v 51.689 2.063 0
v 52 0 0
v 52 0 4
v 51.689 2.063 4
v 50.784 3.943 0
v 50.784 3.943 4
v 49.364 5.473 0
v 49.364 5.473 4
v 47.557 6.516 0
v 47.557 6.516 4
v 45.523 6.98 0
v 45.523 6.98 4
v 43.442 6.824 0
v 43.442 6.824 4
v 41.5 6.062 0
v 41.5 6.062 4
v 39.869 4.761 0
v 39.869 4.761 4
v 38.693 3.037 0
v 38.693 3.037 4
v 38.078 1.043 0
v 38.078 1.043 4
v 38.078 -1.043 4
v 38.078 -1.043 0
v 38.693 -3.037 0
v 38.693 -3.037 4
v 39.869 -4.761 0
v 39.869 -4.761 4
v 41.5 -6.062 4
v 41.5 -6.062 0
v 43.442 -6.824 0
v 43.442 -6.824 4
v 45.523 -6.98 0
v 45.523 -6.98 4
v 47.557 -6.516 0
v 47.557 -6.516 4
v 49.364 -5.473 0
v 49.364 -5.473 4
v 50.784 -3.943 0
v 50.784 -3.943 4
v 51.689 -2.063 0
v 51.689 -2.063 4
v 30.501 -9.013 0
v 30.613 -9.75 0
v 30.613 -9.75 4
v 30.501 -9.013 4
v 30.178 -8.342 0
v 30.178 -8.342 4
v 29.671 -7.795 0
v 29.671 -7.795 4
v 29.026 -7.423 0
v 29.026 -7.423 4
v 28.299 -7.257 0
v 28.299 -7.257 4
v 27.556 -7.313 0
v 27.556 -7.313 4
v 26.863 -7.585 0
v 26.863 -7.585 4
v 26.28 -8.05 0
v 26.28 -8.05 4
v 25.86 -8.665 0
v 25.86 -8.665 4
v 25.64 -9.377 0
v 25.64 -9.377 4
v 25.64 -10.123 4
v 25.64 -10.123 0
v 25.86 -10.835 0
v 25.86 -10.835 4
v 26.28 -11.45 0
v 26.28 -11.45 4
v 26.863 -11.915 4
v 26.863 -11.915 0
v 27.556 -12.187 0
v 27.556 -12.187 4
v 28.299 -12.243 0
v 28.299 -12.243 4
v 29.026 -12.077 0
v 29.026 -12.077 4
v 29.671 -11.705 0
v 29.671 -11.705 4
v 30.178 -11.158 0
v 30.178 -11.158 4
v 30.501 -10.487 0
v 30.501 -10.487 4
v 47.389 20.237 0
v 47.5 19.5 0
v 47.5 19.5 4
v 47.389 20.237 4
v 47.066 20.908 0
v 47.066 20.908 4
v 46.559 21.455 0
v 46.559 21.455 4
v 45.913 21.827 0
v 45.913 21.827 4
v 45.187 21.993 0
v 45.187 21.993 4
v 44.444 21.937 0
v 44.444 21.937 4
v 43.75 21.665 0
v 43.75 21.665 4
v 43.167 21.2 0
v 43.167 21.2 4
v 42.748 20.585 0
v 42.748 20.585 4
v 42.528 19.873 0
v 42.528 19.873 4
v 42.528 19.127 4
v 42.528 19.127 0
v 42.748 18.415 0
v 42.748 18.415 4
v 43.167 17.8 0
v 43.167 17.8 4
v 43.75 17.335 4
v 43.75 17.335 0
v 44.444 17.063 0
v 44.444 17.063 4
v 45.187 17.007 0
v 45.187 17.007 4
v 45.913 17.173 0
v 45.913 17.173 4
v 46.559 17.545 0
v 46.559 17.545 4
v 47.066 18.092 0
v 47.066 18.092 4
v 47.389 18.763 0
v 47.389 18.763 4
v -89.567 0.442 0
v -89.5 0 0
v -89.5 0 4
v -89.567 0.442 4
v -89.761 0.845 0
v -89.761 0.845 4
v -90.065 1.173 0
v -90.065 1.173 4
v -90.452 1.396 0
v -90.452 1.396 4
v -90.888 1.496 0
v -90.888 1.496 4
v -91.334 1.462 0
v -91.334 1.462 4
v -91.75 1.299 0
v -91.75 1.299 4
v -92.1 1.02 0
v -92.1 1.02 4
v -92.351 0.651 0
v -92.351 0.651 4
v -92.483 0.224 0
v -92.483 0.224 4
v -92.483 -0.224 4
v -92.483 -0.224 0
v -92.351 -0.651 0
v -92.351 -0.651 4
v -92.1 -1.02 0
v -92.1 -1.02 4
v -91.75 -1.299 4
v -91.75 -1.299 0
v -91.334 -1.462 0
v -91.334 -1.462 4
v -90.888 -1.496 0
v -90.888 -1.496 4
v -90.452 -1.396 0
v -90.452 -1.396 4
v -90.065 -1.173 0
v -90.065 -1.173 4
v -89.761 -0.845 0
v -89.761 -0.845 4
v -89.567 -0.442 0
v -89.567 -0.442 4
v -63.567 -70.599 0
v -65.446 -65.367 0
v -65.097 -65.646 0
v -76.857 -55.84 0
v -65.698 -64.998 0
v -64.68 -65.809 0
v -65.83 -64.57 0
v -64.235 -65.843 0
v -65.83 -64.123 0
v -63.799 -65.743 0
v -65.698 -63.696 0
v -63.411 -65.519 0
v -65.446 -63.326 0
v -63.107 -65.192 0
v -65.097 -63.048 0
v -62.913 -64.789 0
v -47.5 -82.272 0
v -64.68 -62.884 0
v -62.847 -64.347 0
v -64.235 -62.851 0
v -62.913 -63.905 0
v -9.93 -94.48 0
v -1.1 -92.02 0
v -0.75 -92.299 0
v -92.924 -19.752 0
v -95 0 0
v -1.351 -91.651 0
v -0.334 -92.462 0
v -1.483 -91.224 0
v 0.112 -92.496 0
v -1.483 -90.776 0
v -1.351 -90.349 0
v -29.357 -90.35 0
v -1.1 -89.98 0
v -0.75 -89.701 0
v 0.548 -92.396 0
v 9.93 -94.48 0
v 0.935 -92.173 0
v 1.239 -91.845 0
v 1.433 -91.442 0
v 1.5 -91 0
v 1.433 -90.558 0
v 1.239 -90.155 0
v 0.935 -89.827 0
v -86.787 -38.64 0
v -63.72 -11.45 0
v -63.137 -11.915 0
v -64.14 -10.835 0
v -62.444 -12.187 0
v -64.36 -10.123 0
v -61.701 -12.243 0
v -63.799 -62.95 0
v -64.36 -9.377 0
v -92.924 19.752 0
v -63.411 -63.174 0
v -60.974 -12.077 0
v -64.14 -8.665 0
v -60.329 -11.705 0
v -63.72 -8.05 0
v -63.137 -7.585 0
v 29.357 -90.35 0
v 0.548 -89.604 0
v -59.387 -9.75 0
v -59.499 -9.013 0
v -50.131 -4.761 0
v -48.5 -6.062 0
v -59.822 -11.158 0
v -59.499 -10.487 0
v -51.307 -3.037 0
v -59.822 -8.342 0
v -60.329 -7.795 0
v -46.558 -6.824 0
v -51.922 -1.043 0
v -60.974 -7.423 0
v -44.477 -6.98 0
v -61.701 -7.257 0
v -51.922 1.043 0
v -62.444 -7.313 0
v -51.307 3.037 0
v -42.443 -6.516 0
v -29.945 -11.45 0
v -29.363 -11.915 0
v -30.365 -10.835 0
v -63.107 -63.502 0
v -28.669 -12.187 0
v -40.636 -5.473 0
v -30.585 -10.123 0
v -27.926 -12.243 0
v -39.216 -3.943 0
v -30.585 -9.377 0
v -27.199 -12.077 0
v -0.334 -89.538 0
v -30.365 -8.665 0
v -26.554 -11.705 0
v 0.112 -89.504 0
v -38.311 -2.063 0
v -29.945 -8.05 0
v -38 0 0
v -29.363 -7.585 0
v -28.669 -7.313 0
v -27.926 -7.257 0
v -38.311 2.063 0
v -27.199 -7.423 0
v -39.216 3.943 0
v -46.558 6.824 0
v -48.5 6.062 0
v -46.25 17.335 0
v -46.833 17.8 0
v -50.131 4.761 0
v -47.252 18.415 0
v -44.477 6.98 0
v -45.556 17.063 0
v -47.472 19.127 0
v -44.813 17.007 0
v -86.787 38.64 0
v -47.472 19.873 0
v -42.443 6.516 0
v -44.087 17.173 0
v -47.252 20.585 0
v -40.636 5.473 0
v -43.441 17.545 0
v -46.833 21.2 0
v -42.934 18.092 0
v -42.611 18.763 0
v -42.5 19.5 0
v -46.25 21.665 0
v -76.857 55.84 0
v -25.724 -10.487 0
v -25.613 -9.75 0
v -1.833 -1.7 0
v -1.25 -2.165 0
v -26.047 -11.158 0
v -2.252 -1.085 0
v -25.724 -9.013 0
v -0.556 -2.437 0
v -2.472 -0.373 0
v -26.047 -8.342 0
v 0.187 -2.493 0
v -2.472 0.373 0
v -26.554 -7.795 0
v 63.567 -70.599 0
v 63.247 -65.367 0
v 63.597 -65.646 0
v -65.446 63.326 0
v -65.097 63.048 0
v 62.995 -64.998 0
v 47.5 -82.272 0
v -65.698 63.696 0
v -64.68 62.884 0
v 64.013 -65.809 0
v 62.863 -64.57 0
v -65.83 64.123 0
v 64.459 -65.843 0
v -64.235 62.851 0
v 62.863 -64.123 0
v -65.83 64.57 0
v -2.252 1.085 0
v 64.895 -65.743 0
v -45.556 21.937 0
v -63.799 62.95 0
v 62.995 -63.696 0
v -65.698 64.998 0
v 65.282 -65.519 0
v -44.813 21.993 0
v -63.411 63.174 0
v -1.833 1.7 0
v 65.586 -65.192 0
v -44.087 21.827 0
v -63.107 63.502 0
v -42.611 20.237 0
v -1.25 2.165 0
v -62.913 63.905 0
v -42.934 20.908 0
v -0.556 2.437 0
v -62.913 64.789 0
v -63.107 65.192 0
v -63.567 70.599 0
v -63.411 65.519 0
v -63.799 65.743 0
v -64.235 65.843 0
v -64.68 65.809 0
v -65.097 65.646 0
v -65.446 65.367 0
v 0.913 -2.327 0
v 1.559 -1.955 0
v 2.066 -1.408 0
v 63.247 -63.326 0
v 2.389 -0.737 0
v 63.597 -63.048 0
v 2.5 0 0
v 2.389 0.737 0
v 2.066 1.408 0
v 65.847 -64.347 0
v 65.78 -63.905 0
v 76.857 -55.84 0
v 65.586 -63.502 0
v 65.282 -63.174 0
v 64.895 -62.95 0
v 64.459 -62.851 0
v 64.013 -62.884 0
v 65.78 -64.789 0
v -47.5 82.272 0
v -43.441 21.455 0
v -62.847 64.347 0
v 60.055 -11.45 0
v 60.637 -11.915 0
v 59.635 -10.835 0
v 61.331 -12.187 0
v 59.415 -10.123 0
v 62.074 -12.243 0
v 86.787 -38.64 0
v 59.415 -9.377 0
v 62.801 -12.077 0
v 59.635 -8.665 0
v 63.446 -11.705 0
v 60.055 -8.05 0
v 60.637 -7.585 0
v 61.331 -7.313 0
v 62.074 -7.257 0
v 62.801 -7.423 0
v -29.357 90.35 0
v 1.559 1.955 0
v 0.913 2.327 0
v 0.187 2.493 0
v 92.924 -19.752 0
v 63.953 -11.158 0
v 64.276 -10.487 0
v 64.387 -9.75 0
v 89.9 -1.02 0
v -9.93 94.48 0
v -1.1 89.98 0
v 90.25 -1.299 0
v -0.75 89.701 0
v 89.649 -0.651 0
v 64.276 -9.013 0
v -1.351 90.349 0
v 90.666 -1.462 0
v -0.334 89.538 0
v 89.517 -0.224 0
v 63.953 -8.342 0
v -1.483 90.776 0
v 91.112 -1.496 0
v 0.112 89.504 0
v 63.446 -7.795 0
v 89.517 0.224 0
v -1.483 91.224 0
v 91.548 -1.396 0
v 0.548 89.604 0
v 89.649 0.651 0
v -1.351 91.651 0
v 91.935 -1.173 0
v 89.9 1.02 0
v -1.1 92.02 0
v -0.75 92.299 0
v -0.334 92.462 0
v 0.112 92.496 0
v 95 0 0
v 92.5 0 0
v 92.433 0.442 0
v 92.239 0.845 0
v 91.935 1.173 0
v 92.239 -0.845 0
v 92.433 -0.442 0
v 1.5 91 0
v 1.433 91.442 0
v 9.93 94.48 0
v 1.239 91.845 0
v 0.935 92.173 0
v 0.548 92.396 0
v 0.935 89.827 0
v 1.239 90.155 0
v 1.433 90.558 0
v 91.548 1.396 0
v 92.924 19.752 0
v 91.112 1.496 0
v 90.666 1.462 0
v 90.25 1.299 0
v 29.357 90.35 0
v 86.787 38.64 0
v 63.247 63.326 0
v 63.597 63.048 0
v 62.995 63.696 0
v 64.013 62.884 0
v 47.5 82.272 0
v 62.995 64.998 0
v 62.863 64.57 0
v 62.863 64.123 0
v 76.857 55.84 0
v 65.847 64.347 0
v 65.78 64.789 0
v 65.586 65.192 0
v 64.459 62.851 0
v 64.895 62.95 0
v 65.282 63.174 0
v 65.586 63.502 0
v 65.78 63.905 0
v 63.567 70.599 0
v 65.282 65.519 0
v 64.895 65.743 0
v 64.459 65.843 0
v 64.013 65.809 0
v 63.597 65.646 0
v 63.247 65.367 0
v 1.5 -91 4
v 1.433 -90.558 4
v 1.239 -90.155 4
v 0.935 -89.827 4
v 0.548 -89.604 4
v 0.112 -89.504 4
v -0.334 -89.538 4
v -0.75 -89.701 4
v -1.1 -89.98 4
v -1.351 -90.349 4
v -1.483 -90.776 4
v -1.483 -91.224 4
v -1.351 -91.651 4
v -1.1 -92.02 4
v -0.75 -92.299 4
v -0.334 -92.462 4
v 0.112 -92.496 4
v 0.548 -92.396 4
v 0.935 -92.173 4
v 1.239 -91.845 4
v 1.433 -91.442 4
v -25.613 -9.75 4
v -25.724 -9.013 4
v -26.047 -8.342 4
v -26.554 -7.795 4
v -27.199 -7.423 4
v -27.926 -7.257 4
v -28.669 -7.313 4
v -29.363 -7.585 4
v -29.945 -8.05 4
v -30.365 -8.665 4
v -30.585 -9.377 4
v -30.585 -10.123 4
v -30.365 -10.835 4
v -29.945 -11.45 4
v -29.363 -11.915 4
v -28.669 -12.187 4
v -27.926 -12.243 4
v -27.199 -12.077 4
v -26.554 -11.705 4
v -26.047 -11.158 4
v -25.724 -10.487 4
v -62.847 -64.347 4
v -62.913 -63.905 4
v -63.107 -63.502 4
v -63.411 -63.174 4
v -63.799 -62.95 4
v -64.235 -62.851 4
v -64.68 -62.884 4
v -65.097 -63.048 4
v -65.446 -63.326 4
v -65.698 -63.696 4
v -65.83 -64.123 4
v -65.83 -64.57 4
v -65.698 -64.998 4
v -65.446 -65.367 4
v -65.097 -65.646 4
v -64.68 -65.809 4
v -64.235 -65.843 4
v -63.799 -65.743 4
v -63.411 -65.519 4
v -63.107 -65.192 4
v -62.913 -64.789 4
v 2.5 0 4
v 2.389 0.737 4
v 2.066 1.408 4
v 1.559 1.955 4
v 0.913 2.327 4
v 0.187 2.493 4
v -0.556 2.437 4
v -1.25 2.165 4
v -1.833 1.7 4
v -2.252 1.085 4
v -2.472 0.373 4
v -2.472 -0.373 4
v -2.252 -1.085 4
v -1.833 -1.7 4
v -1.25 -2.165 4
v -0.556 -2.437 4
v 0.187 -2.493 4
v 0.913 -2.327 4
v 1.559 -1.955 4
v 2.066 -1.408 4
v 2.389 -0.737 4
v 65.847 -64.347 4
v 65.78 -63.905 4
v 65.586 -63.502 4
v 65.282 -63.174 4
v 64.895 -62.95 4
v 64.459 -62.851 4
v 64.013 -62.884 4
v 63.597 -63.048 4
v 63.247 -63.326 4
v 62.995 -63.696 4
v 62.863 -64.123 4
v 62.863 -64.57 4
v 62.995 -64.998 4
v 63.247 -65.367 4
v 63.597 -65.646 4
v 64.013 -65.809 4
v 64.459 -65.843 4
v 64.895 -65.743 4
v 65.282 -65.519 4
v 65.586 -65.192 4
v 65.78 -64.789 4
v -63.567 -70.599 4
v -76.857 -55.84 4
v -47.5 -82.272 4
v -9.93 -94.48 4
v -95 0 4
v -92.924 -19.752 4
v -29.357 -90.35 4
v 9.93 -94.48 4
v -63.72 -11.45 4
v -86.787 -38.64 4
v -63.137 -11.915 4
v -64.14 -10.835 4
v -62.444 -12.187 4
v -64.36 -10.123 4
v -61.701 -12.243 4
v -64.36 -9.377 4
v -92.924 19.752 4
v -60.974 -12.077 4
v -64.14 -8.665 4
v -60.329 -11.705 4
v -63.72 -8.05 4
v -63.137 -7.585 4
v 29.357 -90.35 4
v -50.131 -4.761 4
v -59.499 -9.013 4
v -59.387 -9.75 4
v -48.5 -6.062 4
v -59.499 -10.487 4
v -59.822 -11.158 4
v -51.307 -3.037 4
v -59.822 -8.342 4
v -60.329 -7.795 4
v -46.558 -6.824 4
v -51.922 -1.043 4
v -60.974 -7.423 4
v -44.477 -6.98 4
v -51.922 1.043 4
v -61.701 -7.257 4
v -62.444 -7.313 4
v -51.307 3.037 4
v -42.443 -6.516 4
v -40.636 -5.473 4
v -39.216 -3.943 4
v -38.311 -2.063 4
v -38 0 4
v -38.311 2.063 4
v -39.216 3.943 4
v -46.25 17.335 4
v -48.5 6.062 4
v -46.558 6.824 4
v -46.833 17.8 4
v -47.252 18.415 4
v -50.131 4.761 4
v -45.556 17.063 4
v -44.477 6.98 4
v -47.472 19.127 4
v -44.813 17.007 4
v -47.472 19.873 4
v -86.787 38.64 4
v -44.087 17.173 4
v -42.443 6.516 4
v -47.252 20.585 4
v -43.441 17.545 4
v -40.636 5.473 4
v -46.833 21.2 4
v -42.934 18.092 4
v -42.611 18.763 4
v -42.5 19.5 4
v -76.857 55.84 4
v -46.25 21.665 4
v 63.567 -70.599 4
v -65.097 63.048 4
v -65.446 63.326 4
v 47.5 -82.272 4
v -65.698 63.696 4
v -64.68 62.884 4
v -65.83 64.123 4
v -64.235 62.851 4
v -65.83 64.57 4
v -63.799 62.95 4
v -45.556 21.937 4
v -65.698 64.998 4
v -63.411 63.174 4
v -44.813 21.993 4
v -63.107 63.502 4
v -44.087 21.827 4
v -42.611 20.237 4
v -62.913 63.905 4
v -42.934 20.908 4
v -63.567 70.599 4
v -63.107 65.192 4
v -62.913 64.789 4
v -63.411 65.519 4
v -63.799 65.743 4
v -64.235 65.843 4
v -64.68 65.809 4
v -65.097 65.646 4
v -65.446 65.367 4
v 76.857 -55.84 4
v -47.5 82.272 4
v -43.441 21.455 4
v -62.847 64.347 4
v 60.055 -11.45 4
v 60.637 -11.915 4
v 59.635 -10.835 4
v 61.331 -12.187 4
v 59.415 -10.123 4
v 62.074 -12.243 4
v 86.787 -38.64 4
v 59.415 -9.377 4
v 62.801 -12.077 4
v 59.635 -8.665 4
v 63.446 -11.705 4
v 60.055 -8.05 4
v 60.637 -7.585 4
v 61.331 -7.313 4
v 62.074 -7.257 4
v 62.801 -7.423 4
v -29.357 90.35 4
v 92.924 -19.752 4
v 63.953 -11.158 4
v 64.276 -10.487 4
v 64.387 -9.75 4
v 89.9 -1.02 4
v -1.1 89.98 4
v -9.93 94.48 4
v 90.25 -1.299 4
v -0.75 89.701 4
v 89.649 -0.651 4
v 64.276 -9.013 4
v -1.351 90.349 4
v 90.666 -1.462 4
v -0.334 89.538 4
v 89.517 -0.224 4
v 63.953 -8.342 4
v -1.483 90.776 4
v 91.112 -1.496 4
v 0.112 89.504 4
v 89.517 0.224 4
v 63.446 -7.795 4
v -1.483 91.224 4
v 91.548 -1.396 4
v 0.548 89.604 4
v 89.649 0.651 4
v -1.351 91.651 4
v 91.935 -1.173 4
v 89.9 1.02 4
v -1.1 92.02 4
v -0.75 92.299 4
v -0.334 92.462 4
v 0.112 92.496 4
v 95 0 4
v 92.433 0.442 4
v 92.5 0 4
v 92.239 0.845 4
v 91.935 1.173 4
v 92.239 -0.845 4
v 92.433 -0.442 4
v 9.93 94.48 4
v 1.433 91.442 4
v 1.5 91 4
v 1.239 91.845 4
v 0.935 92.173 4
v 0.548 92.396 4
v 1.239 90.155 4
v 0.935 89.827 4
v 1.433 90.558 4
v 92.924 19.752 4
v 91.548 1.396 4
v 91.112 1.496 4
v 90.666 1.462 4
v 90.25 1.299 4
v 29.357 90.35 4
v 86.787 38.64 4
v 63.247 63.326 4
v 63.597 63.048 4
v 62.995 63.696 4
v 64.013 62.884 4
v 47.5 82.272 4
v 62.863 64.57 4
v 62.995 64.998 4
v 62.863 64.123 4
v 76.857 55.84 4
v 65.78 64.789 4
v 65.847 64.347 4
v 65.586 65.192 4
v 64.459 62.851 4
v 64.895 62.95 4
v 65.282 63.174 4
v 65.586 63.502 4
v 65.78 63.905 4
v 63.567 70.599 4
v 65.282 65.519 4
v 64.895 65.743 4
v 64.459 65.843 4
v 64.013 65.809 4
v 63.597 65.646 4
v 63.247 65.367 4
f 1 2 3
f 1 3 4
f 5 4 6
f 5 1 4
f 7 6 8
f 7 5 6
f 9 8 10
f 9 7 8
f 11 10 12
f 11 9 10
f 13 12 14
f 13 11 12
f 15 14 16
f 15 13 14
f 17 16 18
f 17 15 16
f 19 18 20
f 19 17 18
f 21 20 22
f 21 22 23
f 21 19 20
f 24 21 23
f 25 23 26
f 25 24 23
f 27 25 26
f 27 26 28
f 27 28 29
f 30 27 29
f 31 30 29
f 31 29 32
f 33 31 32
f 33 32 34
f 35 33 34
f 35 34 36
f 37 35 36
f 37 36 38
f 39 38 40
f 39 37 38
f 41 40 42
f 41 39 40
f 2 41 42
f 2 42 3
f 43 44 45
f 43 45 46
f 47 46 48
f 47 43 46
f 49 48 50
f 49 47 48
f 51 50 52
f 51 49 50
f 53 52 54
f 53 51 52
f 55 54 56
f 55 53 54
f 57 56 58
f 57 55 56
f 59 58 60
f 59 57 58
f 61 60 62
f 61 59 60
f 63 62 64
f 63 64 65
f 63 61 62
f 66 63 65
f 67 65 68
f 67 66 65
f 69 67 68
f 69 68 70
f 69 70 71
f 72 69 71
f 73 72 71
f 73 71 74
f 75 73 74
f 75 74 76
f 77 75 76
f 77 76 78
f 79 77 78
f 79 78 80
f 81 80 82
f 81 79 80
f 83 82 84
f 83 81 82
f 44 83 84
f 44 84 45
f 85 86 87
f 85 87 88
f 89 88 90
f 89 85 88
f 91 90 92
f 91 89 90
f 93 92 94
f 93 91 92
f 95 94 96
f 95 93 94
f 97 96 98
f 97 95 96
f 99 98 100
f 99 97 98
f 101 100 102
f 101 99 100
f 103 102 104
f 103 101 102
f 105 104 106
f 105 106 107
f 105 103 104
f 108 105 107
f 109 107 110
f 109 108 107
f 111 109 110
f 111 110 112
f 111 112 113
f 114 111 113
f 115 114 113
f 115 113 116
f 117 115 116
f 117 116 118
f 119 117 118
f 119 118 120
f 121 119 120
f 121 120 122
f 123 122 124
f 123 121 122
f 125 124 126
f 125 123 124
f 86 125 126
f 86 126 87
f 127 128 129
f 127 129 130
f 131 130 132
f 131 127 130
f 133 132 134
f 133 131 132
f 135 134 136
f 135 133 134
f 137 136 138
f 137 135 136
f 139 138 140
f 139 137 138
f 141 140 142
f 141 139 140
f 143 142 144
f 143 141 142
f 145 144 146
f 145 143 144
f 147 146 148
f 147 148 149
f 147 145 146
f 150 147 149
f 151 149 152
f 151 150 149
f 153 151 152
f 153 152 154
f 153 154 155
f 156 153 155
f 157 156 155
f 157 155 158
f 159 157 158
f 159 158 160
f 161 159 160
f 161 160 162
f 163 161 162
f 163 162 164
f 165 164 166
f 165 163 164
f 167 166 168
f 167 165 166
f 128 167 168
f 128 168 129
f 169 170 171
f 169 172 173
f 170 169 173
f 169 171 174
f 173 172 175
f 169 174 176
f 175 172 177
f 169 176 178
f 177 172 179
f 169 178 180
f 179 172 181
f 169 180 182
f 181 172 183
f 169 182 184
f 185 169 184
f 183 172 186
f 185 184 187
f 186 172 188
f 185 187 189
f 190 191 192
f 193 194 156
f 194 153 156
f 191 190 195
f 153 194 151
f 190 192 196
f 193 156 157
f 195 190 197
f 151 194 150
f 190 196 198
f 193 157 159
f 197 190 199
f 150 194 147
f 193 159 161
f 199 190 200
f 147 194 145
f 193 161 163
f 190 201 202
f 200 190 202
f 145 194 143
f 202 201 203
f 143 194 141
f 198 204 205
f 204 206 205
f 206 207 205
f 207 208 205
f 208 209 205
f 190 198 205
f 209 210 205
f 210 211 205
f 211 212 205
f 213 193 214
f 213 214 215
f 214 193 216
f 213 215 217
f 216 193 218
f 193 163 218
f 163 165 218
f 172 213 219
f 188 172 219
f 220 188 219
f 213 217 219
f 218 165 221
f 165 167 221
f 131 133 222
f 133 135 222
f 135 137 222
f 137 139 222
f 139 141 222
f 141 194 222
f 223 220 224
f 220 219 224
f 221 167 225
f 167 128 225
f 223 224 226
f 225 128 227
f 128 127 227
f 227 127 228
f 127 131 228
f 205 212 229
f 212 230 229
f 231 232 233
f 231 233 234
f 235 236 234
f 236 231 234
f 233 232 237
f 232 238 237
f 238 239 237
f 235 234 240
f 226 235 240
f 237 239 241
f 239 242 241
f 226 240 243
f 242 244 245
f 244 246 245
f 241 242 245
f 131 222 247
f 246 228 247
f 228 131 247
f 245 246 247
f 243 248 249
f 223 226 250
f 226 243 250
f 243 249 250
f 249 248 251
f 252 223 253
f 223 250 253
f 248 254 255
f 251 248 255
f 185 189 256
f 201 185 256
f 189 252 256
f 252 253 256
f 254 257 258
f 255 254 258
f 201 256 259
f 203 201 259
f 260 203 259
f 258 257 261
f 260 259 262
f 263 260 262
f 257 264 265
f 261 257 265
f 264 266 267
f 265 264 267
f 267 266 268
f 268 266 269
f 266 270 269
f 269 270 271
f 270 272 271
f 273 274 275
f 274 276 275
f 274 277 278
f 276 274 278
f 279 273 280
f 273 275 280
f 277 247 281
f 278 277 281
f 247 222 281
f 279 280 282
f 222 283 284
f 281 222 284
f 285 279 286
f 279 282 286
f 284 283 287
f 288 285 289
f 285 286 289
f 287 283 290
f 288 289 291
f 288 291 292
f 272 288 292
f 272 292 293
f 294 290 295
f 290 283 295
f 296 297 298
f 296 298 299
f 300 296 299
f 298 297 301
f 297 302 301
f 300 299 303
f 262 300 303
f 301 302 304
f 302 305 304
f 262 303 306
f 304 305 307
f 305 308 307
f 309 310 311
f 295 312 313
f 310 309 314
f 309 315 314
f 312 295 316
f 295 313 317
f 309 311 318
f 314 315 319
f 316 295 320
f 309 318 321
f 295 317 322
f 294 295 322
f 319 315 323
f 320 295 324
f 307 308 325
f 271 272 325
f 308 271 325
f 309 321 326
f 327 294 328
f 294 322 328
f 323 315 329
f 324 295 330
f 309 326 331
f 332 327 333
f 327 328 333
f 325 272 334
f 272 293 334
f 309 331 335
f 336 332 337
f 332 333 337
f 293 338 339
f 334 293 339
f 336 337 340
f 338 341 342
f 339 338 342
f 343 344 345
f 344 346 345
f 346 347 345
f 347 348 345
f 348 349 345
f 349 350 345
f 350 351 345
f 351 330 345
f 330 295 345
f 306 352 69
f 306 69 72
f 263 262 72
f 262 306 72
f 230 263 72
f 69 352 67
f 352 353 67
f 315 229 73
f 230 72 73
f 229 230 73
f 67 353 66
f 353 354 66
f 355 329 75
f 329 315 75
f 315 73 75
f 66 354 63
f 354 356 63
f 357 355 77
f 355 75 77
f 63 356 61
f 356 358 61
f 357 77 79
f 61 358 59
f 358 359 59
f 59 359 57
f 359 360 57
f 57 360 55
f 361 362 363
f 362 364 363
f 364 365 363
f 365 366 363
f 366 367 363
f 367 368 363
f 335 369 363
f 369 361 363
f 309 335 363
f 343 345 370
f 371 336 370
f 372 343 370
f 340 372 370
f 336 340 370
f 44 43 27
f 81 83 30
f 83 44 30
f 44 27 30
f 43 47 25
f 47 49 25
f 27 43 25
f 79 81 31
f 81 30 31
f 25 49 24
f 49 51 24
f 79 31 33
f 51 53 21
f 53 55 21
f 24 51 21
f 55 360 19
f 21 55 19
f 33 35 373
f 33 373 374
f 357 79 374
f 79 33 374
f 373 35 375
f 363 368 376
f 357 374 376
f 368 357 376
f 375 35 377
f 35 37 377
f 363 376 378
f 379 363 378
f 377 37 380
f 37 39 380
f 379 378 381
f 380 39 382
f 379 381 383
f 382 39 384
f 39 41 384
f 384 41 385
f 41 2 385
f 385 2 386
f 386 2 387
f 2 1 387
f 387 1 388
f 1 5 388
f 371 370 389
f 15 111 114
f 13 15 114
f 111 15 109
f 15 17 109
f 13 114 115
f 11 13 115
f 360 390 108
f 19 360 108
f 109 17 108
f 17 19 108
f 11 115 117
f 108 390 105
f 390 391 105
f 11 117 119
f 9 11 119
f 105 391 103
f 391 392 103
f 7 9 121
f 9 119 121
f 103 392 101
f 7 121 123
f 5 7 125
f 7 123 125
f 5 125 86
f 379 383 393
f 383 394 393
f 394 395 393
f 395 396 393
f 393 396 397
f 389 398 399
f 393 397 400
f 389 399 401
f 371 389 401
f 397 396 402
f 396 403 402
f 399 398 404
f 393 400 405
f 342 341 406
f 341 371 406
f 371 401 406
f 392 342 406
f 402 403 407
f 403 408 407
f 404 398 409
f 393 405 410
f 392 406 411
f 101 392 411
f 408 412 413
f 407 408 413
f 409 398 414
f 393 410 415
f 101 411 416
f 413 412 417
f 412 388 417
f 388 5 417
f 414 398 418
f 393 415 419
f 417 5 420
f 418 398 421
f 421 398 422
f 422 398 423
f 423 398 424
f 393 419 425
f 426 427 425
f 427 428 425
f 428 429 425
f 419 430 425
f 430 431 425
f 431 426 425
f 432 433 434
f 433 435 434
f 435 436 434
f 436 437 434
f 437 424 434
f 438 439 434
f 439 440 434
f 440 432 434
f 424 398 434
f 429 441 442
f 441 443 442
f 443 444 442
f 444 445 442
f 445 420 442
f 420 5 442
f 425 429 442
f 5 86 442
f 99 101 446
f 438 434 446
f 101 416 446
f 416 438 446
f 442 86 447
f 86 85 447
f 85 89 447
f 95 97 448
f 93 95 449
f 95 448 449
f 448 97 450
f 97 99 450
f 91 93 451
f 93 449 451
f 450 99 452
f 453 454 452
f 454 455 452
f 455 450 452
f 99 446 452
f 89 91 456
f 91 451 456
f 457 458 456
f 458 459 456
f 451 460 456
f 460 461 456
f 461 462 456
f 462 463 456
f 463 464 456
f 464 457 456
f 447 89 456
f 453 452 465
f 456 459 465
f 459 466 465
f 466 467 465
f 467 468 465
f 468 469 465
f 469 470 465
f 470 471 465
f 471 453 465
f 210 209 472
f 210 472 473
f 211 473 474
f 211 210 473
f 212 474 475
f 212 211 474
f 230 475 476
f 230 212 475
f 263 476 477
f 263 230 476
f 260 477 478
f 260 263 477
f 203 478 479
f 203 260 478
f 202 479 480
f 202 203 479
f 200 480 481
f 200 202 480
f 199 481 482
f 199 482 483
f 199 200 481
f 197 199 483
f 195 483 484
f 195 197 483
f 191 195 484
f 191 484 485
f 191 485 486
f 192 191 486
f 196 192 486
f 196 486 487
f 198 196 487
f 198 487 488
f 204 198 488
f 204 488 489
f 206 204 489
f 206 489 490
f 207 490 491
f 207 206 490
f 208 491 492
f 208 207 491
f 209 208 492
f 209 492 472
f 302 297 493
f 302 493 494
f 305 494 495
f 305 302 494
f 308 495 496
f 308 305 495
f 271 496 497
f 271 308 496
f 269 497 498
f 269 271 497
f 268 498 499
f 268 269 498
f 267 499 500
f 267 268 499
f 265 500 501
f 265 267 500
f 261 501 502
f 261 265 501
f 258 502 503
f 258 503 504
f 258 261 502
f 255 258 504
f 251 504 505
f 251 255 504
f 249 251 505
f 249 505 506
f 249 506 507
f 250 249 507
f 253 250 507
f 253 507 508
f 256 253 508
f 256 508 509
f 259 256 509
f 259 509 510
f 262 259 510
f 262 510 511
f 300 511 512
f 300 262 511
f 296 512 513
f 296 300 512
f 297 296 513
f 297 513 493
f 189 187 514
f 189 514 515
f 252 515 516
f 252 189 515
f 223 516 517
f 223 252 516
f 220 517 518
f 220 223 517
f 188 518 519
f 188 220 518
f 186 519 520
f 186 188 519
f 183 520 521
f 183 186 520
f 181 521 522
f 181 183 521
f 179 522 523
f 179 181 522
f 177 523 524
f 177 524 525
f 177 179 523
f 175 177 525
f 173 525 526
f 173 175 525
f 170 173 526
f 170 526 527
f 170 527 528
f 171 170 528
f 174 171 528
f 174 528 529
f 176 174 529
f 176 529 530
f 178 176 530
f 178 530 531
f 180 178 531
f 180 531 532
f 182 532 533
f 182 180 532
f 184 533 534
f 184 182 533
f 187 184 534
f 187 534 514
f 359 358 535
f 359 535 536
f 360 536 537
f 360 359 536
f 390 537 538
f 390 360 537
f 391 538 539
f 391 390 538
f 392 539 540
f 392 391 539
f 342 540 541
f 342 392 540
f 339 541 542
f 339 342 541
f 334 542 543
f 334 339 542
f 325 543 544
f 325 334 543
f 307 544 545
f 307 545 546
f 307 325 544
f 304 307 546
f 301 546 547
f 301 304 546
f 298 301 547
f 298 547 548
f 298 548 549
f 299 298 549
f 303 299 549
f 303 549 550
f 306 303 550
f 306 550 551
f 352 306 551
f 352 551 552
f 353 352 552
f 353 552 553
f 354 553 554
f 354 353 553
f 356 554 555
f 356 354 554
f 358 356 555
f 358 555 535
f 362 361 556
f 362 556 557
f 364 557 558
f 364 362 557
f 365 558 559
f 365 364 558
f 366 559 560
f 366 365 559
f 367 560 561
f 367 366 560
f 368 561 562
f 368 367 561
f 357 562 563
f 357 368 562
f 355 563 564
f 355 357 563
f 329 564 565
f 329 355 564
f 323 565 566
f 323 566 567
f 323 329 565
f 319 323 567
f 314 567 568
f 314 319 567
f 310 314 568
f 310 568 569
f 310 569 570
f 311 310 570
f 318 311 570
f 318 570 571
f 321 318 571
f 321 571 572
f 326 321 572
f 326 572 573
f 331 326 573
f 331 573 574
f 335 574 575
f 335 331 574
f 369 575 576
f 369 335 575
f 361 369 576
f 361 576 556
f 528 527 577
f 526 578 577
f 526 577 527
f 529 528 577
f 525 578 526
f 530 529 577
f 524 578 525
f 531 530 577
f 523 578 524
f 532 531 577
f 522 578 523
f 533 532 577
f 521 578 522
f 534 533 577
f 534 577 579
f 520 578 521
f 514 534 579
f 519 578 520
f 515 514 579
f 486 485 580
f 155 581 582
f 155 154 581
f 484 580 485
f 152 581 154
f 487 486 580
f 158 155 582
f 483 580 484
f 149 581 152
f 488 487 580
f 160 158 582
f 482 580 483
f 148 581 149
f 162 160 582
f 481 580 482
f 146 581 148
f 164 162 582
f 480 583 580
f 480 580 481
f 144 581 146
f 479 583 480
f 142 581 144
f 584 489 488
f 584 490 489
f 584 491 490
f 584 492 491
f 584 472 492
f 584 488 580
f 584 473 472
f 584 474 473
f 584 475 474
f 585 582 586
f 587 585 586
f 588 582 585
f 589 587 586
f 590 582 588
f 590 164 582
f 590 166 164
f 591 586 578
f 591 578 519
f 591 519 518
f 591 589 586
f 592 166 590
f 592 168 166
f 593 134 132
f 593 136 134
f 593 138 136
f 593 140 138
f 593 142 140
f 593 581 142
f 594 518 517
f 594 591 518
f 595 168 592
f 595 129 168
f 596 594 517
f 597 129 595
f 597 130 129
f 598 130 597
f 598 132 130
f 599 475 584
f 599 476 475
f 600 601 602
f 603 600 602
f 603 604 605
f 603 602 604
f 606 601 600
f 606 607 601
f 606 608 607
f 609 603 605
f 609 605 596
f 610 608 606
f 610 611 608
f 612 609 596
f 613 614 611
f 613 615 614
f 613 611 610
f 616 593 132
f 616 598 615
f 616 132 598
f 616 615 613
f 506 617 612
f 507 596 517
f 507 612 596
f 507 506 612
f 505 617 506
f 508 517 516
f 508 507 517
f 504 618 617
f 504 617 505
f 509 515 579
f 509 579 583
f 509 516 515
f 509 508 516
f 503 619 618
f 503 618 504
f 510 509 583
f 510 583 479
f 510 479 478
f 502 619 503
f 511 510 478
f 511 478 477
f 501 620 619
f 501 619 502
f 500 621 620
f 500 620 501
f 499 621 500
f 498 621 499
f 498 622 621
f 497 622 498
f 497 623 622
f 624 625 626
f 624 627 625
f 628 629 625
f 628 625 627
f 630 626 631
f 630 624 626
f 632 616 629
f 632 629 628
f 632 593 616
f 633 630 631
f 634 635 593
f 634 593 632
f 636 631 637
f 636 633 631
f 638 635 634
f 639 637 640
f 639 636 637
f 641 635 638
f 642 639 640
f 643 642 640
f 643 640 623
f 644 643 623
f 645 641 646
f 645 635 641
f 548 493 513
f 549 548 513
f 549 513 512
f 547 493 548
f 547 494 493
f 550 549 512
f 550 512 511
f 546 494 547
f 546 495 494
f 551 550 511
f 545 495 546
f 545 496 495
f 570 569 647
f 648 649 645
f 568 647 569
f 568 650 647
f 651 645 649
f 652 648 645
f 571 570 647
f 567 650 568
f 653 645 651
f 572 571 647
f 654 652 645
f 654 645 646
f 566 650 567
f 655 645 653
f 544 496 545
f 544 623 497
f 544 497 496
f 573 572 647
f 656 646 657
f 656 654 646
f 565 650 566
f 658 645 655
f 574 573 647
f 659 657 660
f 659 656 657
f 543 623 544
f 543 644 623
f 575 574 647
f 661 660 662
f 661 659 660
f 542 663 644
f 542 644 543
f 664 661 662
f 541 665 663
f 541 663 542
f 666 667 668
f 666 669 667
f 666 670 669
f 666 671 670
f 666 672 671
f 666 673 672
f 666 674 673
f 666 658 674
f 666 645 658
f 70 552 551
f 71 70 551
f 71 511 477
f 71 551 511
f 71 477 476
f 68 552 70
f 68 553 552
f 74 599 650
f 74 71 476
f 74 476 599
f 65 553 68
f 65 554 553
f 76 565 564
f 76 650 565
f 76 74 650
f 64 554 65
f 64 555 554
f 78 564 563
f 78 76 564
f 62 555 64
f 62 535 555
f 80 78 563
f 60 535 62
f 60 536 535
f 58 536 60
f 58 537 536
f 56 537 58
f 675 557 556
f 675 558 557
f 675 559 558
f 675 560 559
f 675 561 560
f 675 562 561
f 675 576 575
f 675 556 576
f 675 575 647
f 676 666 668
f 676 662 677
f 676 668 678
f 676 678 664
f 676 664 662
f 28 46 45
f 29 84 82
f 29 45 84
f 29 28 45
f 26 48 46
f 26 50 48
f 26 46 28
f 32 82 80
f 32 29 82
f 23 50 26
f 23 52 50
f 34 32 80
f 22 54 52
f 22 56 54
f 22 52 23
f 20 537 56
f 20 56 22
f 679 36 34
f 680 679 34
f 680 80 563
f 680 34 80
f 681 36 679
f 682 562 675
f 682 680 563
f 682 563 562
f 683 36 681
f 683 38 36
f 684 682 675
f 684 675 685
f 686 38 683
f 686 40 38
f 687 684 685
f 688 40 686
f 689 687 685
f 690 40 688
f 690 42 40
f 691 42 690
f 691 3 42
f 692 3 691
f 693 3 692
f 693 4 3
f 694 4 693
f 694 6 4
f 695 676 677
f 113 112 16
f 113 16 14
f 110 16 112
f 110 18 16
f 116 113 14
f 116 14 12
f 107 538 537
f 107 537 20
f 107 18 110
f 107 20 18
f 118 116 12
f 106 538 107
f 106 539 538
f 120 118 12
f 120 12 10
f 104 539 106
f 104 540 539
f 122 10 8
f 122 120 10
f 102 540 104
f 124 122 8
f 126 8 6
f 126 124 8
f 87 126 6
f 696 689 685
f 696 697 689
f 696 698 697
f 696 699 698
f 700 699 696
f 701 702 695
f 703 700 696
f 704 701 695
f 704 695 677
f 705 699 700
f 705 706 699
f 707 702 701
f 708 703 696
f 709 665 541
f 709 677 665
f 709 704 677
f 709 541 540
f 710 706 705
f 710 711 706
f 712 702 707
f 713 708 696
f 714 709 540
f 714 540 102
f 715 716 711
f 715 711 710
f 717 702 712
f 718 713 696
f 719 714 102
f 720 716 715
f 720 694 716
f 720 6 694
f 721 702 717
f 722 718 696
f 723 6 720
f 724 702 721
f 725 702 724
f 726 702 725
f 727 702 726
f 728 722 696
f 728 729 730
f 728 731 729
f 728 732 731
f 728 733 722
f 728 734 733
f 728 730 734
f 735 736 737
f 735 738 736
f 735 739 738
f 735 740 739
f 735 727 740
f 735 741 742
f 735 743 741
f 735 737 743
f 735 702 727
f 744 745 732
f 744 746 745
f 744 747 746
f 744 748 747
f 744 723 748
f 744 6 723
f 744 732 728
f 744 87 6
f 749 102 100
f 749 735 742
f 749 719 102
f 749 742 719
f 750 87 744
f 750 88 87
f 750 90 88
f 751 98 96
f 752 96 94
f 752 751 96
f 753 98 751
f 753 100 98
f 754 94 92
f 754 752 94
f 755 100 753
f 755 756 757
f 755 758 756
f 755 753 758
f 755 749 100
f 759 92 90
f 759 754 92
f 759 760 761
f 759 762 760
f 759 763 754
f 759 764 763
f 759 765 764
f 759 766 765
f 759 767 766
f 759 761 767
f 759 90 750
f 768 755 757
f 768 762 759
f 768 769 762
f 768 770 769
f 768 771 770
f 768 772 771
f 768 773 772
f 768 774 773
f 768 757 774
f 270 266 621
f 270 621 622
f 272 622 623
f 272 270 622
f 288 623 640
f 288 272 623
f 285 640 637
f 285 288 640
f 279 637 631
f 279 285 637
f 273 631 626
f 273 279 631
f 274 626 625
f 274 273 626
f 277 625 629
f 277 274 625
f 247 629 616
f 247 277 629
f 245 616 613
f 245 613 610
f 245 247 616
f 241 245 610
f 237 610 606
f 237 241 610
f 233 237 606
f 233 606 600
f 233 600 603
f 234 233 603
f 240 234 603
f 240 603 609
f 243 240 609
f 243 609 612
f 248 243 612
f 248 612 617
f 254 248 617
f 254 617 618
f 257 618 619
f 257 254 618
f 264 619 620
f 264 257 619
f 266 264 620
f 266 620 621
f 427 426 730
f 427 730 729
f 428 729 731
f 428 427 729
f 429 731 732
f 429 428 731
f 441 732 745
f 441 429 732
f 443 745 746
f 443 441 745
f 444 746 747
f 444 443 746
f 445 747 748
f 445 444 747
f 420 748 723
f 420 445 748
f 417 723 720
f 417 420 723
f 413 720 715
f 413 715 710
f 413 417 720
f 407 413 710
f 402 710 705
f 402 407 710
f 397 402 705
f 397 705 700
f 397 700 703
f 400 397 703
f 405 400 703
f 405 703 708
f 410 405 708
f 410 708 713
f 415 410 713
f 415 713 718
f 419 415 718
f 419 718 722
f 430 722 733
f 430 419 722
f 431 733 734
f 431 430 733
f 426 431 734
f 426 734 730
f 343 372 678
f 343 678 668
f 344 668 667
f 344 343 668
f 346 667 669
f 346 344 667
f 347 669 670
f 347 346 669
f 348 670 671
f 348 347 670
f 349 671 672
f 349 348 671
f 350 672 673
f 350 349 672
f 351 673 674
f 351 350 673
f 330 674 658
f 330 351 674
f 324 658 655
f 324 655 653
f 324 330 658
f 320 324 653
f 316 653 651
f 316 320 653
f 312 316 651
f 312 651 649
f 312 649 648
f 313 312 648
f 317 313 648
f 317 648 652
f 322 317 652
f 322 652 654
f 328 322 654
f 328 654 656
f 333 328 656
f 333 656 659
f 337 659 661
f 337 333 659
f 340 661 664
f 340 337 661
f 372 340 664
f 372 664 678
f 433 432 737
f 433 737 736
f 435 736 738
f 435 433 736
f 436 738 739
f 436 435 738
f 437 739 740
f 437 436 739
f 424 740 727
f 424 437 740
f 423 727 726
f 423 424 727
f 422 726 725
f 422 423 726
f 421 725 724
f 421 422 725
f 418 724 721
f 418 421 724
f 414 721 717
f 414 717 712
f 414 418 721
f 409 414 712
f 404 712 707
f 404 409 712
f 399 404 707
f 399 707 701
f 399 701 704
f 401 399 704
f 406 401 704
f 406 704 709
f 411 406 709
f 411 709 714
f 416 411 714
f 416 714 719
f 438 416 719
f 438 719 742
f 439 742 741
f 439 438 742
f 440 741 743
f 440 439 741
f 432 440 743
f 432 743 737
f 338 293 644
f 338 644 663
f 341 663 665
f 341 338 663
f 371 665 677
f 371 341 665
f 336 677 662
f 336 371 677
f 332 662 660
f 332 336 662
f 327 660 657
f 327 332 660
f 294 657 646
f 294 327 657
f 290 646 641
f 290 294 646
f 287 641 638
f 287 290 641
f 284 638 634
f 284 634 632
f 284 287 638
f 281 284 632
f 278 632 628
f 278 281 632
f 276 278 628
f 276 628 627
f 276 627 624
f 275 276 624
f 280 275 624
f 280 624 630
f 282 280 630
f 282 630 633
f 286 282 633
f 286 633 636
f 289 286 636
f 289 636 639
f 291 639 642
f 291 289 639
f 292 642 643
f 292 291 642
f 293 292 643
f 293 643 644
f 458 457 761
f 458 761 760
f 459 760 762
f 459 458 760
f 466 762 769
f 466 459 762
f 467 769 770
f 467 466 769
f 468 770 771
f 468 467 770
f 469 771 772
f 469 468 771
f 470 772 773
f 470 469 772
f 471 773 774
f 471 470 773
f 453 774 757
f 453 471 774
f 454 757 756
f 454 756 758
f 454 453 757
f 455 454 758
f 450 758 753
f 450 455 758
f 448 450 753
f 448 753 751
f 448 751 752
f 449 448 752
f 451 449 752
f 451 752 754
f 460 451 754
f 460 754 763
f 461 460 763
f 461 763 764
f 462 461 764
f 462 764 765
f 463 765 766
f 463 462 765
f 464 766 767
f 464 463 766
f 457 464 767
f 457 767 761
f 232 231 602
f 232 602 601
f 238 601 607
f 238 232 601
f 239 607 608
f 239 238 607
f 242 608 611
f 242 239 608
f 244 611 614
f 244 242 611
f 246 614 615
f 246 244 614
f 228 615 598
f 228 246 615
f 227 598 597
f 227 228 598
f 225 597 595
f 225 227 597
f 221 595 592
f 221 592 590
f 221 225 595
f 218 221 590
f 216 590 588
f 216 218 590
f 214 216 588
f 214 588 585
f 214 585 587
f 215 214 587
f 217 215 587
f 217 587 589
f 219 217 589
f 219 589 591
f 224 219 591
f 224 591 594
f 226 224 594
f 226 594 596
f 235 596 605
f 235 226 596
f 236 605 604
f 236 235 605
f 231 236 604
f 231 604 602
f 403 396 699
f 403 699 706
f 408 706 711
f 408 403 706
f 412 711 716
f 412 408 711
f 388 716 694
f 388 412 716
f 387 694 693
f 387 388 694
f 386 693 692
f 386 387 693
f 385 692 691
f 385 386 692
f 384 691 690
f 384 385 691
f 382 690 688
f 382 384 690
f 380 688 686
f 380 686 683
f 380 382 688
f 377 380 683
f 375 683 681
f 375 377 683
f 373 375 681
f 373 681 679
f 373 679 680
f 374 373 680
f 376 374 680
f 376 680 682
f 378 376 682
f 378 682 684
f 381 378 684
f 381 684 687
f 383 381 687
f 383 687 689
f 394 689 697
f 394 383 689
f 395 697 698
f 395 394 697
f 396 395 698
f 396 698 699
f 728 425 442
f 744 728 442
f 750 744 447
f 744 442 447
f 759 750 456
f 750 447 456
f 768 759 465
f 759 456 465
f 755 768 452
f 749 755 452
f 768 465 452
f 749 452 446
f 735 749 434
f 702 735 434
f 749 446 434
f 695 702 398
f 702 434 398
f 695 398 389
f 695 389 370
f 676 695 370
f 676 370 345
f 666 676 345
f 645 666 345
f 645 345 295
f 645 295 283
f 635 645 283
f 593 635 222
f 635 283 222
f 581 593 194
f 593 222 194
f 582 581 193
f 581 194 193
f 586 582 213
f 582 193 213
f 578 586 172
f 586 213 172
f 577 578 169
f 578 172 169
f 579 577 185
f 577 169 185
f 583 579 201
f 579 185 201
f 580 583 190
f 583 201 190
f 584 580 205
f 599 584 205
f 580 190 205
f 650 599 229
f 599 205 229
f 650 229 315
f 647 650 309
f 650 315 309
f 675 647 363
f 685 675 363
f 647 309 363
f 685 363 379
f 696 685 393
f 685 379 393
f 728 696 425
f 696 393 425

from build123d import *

# Parameters (mm, degrees)
SKETCH_R   = 95
SKETCH_R_2 = 7
SKETCH_R_3 = 1.5
SKETCH_R_4 = 2.5
PAD_DEPTH  = 4


with BuildPart() as part:
    # Sketch → Pad (new body)
    with BuildSketch(Plane.XY):
        Circle(SKETCH_R)
        with Locations((-45, 0)):
            Circle(SKETCH_R_2, mode=Mode.SUBTRACT)
        with Locations((45, 0)):
            Circle(SKETCH_R_2, mode=Mode.SUBTRACT)
        with Locations((64.346717, 64.346717)):
            Circle(SKETCH_R_3, mode=Mode.SUBTRACT)
        with Locations((-64.346717, 64.346717)):
            Circle(SKETCH_R_3, mode=Mode.SUBTRACT)
        with Locations((-64.346717, -64.346717)):
            Circle(SKETCH_R_3, mode=Mode.SUBTRACT)
        with Locations((64.346717, -64.346717)):
            Circle(SKETCH_R_3, mode=Mode.SUBTRACT)
        with Locations((-45, 19.5)):
            Circle(SKETCH_R_4, mode=Mode.SUBTRACT)
        with Locations((-28.112505, -9.75)):
            Circle(SKETCH_R_4, mode=Mode.SUBTRACT)
        with Locations((-61.887495, -9.75)):
            Circle(SKETCH_R_4, mode=Mode.SUBTRACT)
        with Locations((45, 19.5)):
            Circle(SKETCH_R_4, mode=Mode.SUBTRACT)
        with Locations((28.112505, -9.75)):
            Circle(SKETCH_R_4, mode=Mode.SUBTRACT)
        with Locations((61.887495, -9.75)):
            Circle(SKETCH_R_4, mode=Mode.SUBTRACT)
        Circle(SKETCH_R_4, mode=Mode.SUBTRACT)
        with Locations((91, 0)):
            Circle(SKETCH_R_3, mode=Mode.SUBTRACT)
        with Locations((-91, 0)):
            Circle(SKETCH_R_3, mode=Mode.SUBTRACT)
        with Locations((0, 91)):
            Circle(SKETCH_R_3, mode=Mode.SUBTRACT)
        with Locations((0, -91)):
            Circle(SKETCH_R_3, mode=Mode.SUBTRACT)
    extrude(amount=PAD_DEPTH)


solid = part.part
